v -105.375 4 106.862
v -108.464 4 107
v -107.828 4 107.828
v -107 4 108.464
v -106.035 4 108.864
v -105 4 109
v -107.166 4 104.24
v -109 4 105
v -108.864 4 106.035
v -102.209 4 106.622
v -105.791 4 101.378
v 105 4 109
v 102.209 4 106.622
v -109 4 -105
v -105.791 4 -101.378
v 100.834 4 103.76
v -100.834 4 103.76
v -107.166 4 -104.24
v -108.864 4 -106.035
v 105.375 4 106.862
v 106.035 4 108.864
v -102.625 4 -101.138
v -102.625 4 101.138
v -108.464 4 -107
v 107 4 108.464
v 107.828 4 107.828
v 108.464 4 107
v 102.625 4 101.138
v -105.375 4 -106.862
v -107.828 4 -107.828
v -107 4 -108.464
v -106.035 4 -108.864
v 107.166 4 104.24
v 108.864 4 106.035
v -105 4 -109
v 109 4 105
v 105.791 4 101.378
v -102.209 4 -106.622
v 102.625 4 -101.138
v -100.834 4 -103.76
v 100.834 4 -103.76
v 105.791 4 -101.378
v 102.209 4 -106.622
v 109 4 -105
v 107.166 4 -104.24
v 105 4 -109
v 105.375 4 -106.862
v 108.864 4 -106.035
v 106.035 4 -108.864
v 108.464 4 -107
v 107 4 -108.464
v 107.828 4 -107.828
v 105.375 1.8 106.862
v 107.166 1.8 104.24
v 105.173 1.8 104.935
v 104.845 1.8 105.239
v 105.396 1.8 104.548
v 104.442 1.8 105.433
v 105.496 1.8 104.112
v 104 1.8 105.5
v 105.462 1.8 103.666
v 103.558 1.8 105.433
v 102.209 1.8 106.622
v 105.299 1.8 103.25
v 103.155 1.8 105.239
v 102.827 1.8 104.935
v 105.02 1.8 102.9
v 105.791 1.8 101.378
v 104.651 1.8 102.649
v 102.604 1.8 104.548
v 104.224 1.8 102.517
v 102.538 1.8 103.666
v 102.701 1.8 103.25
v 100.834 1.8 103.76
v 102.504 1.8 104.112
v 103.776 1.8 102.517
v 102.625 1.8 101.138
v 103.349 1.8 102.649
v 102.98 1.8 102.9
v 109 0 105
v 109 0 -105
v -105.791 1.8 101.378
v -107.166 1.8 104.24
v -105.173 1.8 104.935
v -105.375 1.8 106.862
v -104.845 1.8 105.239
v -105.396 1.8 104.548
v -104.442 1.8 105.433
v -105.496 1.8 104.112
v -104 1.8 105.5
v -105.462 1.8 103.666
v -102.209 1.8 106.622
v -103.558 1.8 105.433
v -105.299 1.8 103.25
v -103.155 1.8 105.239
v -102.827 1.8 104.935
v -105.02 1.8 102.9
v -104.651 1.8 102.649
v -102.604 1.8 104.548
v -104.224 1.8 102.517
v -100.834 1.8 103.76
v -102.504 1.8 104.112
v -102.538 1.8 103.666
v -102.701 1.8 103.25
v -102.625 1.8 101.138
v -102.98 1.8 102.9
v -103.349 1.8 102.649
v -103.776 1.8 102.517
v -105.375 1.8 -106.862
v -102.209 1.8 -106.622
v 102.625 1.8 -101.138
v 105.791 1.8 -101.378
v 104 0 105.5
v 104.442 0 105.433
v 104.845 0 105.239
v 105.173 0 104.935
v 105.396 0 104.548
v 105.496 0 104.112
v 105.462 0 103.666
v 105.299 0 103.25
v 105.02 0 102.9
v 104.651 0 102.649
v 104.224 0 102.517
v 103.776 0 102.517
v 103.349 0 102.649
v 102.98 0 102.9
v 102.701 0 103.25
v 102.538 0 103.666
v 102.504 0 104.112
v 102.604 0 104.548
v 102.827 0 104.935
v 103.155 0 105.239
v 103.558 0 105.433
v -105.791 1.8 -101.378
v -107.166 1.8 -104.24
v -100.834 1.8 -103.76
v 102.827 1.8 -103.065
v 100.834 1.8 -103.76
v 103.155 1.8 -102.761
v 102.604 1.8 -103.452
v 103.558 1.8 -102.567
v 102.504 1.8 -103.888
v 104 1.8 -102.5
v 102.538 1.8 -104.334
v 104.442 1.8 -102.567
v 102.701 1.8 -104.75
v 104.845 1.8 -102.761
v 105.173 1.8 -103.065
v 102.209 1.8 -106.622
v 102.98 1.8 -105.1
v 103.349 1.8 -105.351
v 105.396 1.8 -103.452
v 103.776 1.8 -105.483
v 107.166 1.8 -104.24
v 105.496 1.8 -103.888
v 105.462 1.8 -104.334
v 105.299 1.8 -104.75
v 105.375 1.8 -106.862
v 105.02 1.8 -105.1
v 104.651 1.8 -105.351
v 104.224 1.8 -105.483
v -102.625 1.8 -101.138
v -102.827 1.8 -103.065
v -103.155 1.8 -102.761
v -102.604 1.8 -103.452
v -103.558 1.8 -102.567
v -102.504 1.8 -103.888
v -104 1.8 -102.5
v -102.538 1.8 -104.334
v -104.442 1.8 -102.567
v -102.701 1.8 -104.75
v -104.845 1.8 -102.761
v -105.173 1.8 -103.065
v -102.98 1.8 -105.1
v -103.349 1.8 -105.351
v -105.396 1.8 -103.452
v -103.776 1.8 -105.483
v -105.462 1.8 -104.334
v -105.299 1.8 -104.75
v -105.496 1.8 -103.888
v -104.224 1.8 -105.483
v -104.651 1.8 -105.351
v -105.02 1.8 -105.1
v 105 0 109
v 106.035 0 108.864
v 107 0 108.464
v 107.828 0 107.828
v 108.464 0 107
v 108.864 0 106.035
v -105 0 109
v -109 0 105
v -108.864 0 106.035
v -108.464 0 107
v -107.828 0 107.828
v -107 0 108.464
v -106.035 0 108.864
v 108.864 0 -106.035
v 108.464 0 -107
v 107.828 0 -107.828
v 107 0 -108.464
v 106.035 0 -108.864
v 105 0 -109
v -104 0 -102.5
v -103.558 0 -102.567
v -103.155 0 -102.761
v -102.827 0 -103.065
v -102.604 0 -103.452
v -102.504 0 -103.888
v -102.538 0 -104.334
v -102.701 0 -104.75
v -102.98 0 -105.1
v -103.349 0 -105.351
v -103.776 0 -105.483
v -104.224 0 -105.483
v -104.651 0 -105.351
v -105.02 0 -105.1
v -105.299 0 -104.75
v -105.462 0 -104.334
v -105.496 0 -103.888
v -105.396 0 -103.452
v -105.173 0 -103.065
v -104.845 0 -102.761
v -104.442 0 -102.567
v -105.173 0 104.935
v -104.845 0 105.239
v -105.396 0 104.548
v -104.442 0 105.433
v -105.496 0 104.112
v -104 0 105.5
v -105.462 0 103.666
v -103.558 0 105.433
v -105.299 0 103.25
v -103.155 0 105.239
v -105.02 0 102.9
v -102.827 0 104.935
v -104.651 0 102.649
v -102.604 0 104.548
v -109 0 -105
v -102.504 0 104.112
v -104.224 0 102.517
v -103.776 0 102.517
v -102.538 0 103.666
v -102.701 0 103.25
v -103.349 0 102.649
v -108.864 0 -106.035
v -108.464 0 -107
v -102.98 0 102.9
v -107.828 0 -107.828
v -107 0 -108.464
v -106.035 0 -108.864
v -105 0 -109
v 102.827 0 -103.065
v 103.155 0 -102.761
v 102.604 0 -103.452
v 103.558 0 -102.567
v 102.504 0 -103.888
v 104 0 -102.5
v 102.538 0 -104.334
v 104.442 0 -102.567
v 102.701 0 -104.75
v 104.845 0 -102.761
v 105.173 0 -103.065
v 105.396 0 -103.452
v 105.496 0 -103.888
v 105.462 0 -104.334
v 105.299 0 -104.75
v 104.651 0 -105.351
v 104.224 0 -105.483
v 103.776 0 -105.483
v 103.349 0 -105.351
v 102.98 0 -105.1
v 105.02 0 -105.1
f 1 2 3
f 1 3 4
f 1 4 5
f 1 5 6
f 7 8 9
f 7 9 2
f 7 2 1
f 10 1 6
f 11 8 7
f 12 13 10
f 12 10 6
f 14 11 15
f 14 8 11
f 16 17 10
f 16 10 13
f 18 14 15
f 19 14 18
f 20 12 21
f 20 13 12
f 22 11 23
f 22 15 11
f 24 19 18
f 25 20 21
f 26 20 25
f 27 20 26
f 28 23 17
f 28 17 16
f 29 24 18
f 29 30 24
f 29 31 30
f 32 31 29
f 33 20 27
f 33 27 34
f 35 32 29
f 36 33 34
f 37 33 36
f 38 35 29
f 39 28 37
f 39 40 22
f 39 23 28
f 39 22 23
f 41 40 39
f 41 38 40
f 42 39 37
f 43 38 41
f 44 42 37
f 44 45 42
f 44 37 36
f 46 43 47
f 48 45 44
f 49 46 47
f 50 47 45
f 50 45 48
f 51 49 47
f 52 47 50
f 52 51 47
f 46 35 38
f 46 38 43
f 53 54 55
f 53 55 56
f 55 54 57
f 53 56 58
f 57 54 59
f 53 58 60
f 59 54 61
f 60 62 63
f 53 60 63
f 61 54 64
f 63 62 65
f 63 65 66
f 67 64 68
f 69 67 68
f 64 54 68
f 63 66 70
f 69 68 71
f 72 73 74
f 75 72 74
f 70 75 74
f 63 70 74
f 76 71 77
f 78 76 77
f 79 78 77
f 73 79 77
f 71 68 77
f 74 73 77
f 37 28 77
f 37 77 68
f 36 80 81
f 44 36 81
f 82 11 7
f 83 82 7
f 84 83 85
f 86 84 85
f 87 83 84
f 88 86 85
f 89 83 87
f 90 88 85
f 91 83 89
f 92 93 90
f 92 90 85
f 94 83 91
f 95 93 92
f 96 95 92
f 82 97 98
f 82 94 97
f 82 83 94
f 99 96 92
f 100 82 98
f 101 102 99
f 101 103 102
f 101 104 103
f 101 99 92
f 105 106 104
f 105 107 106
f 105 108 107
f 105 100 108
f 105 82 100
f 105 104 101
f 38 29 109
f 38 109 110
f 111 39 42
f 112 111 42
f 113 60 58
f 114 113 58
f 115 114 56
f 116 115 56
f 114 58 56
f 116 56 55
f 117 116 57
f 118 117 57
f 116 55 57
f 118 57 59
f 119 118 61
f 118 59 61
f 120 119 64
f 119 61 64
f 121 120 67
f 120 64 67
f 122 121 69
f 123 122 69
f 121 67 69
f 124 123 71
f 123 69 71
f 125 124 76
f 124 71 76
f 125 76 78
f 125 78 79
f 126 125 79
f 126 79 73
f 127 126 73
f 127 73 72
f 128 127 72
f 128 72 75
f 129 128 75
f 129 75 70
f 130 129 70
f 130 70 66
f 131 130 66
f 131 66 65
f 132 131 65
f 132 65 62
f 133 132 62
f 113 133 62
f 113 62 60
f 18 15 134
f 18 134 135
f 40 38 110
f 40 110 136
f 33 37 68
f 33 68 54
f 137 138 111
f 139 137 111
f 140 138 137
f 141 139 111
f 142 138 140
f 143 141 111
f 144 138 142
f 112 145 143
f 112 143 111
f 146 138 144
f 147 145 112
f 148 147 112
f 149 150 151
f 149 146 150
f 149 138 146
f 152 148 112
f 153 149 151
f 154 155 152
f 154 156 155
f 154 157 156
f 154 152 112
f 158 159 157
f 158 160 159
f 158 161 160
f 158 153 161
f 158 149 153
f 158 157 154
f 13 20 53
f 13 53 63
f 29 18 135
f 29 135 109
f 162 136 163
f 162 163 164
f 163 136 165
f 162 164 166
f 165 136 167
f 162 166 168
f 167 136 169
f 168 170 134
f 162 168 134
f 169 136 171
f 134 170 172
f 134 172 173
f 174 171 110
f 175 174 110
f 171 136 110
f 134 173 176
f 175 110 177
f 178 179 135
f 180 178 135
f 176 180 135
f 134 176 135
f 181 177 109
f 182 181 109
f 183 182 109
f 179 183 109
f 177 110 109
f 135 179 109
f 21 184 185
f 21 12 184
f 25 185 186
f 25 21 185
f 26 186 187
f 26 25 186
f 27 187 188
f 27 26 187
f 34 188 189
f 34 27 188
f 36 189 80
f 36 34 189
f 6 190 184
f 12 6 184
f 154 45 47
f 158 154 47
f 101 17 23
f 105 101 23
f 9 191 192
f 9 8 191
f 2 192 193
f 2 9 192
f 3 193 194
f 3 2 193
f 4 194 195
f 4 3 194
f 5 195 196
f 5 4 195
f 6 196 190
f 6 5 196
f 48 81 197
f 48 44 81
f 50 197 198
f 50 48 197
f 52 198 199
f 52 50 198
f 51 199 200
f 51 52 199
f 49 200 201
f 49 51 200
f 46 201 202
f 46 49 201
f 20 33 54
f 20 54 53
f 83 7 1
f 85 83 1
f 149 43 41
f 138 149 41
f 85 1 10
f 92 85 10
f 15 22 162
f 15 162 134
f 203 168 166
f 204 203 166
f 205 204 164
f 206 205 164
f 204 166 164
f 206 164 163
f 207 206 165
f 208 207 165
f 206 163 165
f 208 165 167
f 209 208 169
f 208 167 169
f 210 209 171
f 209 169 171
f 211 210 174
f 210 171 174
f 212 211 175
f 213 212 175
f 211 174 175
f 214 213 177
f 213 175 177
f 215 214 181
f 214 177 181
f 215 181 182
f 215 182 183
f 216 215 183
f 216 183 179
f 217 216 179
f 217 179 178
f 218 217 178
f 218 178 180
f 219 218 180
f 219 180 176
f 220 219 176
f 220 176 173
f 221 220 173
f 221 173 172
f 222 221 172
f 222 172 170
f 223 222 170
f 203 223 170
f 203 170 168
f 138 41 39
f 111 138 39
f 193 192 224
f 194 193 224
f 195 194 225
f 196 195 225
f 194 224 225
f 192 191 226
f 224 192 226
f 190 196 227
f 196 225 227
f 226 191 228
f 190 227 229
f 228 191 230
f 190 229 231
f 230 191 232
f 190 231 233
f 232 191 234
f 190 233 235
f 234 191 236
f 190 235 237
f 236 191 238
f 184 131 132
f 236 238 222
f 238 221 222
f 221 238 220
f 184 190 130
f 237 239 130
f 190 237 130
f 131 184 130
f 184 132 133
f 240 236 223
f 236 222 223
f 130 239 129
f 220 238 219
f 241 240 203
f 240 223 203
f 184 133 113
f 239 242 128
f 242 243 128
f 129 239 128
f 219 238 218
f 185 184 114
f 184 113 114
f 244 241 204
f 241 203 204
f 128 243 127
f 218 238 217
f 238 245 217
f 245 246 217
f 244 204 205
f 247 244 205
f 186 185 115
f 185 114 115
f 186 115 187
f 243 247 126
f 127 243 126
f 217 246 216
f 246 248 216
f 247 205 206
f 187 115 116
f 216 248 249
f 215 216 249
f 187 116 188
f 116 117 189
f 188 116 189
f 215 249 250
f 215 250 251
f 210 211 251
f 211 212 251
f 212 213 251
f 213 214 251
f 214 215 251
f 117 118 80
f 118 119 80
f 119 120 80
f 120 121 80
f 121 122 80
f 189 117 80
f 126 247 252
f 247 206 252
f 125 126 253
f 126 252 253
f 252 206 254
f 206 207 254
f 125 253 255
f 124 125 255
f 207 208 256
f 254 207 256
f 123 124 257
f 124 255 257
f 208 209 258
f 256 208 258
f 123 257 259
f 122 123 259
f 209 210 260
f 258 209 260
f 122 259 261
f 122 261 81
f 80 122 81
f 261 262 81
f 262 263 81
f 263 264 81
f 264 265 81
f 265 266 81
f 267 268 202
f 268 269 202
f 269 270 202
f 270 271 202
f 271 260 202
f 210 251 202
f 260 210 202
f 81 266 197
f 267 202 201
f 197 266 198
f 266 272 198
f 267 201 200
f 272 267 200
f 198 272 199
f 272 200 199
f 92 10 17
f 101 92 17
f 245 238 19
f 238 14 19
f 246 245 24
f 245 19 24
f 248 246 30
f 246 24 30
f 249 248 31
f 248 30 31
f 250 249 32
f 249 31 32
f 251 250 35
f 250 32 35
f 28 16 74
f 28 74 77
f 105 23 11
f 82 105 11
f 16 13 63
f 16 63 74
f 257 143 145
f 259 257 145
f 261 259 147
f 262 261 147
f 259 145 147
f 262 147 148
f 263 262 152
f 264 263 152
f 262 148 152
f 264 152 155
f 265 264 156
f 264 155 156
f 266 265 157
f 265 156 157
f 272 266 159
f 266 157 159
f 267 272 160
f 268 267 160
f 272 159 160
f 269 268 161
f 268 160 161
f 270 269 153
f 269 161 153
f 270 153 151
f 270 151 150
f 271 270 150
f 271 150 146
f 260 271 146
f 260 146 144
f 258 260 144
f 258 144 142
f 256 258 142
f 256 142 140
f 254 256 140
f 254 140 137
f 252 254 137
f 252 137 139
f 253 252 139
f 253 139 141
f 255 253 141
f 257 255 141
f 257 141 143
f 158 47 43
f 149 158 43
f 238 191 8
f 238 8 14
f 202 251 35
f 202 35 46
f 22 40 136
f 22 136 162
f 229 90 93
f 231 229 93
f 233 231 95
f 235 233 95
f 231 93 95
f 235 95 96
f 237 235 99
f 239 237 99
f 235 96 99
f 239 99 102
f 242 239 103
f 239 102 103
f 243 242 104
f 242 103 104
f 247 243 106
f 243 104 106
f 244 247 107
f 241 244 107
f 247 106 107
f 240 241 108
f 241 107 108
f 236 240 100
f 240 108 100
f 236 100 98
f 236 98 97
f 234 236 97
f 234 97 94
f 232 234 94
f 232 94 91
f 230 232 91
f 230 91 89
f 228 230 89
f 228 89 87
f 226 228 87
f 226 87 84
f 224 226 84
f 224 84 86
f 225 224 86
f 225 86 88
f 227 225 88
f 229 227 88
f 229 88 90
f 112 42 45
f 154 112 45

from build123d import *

# Parameters (mm, degrees)
SKETCH_1_W          = 218
SKETCH_1_H          = 218
EXTRUDE_1_DEPTH     = 4
FILLET_1_R          = 4
SKETCH_2_R          = 1.5
CUT_EXTRUDE_3_DEPTH = 2.2
SKETCH_2_3_R        = 1.5
CUT_EXTRUDE_4_DEPTH = 155.201167311


with BuildPart() as part:
    # 草图1 → 凸台-拉伸1 (new body)
    with BuildSketch(Plane(origin=(0, 0, 0), x_dir=(1, 0, 0), z_dir=(0, 1, 0))):
        Rectangle(SKETCH_1_W, SKETCH_1_H)
    extrude(amount=EXTRUDE_1_DEPTH)

    # 圆角1
    fillet_1_edges = [part.edges().sort_by_distance(p)[0] for p in [
        (-109, 2, -109),
        (109, 2, -109),
        (109, 2, 109),
        (-109, 2, 109),
    ]]
    fillet(fillet_1_edges, radius=FILLET_1_R)

    # 草图2 → 切除-拉伸3 (cut)
    # profile 1 of 4: a face of its own
    with BuildSketch(Plane(origin=(0, 4, 0), x_dir=(1, 0, 0), z_dir=(0, 1, 0))):
        Polygon((105.375169377, 106.862209377), (102.208838657, 106.622036303), (100.83366928, 103.759826926), (102.624830623, 101.137790623), (105.791161343, 101.377963697), (107.16633072, 104.240173074), align=None)
        with Locations((104, 104)):
            Circle(SKETCH_2_R, mode=Mode.SUBTRACT)
    # profile 2 of 4: a face of its own
    with BuildSketch(Plane(origin=(0, 4, 0), x_dir=(1, 0, 0), z_dir=(0, 1, 0))):
        Polygon((107.16633072, -104.240173074), (105.375169377, -106.862209377), (102.208838657, -106.622036303), (100.83366928, -103.759826926), (102.624830623, -101.137790623), (105.791161343, -101.377963697), align=None)
        with Locations((104, -104)):
            Circle(SKETCH_2_R, mode=Mode.SUBTRACT)
    # profile 3 of 4: a face of its own
    with BuildSketch(Plane(origin=(0, 4, 0), x_dir=(1, 0, 0), z_dir=(0, 1, 0))):
        Polygon((-107.16633072, -104.240173074), (-105.375169377, -106.862209377), (-102.208838657, -106.622036303), (-100.83366928, -103.759826926), (-102.624830623, -101.137790623), (-105.791161343, -101.377963697), align=None)
        with Locations((-104, -104)):
            Circle(SKETCH_2_R, mode=Mode.SUBTRACT)
    # profile 4 of 4: a face of its own
    with BuildSketch(Plane(origin=(0, 4, 0), x_dir=(1, 0, 0), z_dir=(0, 1, 0))):
        Polygon((-105.791161343, 101.377963697), (-107.16633072, 104.240173074), (-105.375169377, 106.862209377), (-102.208838657, 106.622036303), (-100.83366928, 103.759826926), (-102.624830623, 101.137790623), align=None)
        with Locations((-104, 104)):
            Circle(SKETCH_2_R, mode=Mode.SUBTRACT)
    extrude(amount=-CUT_EXTRUDE_3_DEPTH, mode=Mode.SUBTRACT)

    # 草图2<3> → 切除-拉伸4 (cut, through all)
    with BuildSketch(Plane(origin=(0, 4, 0), x_dir=(1, 0, 0), z_dir=(0, 1, 0))):
        with Locations((104, 104)):
            Circle(SKETCH_2_3_R)
        with Locations((104, -104)):
            Circle(SKETCH_2_3_R)
        with Locations((-104, -104)):
            Circle(SKETCH_2_3_R)
        with Locations((-104, 104)):
            Circle(SKETCH_2_3_R)
    extrude(amount=-CUT_EXTRUDE_4_DEPTH, mode=Mode.SUBTRACT)


solid = part.part
